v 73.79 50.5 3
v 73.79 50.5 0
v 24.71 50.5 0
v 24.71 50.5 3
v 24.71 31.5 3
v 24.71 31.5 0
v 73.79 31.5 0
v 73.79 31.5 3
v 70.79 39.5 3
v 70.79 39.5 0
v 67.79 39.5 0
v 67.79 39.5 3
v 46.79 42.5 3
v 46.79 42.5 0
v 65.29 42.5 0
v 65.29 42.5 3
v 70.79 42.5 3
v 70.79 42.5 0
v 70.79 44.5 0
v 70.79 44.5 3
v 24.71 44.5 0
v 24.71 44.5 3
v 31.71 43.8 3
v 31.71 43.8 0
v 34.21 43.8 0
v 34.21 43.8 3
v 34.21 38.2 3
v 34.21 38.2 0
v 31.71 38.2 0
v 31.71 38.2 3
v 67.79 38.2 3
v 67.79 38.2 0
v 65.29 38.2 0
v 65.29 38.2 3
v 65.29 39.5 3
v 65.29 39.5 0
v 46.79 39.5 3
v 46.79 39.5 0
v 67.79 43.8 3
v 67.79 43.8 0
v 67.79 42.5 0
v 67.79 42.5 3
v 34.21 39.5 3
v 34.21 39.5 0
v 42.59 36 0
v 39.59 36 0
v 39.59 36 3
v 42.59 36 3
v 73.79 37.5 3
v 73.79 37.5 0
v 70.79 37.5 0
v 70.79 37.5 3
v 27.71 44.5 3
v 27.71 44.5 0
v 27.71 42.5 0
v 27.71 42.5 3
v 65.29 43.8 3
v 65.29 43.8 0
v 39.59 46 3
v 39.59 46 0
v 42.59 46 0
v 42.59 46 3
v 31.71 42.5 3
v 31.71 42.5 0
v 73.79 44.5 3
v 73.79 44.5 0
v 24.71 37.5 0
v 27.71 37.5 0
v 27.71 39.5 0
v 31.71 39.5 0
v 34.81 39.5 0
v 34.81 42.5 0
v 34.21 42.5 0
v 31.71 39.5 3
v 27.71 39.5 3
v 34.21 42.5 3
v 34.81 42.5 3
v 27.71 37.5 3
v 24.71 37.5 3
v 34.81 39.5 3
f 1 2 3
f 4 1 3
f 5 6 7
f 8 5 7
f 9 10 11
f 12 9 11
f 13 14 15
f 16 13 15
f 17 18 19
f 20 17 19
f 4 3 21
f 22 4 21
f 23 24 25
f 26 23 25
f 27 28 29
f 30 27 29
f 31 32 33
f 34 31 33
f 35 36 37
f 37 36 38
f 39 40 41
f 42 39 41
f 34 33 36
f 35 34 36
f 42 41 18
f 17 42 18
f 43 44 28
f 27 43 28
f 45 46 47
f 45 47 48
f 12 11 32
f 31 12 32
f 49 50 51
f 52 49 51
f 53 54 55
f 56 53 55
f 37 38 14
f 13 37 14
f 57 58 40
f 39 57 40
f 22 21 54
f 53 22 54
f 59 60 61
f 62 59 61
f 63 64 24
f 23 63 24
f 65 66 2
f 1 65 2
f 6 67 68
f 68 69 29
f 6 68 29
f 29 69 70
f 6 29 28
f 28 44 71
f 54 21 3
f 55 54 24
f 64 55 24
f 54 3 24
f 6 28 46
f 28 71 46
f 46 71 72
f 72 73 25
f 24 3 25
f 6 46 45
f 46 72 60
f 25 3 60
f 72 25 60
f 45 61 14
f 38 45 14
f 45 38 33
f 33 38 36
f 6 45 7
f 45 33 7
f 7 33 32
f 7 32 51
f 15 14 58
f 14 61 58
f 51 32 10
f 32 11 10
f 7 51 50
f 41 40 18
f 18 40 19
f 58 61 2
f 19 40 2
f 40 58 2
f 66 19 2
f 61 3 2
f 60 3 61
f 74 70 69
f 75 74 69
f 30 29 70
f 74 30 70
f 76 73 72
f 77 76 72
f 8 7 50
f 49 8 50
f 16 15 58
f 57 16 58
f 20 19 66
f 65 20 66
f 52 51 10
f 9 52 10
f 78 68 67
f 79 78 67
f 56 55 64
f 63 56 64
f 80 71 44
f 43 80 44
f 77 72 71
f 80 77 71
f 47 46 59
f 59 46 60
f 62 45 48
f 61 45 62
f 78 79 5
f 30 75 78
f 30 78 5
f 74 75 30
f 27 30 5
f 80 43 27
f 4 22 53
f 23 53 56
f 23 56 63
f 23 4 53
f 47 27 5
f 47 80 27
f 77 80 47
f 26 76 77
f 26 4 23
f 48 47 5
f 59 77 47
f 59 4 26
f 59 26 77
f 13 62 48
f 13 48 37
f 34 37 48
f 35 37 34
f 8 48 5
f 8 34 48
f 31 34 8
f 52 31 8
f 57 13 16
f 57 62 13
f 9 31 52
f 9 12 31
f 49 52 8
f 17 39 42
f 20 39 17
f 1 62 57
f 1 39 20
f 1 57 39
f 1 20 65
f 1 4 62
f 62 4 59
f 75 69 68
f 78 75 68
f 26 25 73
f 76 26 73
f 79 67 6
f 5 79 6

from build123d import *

# Parameters (mm, degrees)
MODEL_W             = 3
MODEL_H             = 9.9999
BOSS_EXTRUDE1_DEPTH = 3


with BuildPart() as part:
    # Model → Boss-Extrude1 (new body)
    with BuildSketch(Plane.XY):
        Polygon((73.79, 50.5), (24.71, 50.5), (24.71, 44.5), (27.71, 44.5), (27.71, 42.5), (31.71, 42.5), (31.71, 43.8), (34.21, 43.8), (34.21, 42.5), (34.81, 42.5), (34.81, 39.5), (34.21, 39.5), (34.21, 38.2), (31.71, 38.2), (31.71, 39.5), (27.71, 39.5), (27.71, 37.5), (24.71, 37.5), (24.71, 31.5), (46.51, 31.5), (73.79, 31.5), (73.79, 37.5), (70.79, 37.5), (70.79, 39.5), (67.79, 39.5), (67.79, 38.2), (65.29, 38.2), (65.29, 39.5), (46.79, 39.5), (46.79, 42.5), (65.29, 42.5), (65.29, 43.8), (67.79, 43.8), (67.79, 42.5), (70.79, 42.5), (70.79, 44.5), (73.79, 44.5), align=None)
        with Locations((41.09, 41.00005)):
            Rectangle(MODEL_W, MODEL_H, mode=Mode.SUBTRACT)
    extrude(amount=BOSS_EXTRUDE1_DEPTH)


solid = part.part
